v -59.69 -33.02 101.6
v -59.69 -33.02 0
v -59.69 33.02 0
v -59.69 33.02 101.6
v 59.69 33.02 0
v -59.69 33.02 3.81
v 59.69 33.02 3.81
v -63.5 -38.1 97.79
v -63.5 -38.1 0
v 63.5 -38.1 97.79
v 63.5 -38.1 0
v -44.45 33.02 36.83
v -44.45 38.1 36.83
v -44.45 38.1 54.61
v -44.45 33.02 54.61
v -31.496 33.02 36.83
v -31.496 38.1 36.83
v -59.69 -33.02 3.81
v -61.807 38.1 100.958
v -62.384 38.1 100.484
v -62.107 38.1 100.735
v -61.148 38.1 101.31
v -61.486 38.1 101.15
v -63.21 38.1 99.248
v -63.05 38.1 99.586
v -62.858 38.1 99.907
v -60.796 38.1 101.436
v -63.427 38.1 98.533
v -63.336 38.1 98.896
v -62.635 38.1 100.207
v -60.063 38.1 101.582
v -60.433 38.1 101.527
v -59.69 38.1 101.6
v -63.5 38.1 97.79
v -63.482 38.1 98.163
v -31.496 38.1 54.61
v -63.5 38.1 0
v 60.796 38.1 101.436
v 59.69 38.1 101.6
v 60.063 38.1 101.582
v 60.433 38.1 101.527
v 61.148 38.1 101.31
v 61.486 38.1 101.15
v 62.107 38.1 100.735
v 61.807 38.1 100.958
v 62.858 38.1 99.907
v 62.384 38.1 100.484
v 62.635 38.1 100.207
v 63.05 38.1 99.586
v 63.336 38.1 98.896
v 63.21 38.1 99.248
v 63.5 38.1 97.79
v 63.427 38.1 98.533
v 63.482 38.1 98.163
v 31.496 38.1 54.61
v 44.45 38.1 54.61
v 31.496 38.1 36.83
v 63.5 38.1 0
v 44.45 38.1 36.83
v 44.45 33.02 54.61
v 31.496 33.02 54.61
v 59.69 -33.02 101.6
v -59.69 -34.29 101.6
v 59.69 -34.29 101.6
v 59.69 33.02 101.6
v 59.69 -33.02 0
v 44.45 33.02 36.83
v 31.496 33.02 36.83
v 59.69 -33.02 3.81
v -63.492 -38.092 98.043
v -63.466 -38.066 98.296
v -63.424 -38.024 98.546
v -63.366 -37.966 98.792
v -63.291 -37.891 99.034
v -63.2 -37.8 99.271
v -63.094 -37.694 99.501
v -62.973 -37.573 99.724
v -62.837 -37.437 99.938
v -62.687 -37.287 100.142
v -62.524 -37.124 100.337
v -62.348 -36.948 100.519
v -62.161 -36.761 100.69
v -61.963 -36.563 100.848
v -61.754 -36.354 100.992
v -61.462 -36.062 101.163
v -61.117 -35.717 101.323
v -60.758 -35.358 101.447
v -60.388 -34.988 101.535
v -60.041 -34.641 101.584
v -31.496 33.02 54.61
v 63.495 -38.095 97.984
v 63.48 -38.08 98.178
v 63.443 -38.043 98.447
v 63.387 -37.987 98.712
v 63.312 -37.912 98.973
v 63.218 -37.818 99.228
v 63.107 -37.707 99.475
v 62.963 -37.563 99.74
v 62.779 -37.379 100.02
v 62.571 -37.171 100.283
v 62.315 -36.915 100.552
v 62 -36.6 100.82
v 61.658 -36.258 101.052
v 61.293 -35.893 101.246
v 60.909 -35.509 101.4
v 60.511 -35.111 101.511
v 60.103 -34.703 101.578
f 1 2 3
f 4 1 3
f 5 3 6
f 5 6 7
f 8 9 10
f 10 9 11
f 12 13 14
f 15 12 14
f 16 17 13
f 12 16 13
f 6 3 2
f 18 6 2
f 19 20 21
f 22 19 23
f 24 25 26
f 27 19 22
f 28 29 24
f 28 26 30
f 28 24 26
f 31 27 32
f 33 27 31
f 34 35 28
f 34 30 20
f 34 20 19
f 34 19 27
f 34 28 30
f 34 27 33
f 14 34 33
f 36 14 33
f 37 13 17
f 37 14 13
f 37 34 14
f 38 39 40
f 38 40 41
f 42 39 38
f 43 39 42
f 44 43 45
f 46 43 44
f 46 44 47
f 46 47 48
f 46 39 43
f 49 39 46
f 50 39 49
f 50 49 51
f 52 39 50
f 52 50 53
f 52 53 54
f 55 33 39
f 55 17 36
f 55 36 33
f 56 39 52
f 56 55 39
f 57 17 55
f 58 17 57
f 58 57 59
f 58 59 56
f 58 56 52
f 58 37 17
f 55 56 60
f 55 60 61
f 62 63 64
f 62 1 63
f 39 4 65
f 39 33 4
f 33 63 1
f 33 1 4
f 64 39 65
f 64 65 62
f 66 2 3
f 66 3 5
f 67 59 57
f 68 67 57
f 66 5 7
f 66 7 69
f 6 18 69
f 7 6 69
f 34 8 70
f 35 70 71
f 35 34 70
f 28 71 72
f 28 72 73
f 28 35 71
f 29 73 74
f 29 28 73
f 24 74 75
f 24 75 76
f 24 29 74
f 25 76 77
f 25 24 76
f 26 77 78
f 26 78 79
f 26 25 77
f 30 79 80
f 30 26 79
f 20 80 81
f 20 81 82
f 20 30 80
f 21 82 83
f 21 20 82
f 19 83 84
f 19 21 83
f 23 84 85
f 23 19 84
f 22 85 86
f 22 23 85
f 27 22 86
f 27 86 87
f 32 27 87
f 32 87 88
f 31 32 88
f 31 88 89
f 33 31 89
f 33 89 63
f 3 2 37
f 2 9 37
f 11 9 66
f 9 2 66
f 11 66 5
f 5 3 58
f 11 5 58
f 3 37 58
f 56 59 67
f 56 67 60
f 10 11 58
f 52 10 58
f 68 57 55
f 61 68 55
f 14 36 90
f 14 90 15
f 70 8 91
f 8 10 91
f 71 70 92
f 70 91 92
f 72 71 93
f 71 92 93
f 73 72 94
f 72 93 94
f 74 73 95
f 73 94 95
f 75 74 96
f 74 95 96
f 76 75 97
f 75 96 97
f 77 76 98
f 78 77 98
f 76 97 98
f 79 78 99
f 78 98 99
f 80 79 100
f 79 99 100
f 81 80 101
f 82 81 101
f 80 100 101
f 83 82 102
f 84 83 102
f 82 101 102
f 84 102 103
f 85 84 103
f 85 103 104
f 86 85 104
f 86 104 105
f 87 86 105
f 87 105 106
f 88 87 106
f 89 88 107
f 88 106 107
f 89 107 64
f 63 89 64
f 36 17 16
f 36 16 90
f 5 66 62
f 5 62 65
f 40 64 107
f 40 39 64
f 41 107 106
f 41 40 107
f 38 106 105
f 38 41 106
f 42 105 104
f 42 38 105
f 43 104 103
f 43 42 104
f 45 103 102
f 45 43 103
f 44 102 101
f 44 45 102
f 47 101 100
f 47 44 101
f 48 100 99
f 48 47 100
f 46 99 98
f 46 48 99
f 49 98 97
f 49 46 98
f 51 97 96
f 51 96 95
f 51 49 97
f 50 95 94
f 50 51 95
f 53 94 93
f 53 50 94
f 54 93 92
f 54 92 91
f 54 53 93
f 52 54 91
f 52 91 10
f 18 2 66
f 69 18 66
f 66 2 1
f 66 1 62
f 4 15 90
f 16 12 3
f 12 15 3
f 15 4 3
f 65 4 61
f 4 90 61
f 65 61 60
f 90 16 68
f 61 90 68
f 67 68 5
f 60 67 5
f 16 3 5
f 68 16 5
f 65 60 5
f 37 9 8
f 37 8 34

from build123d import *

# Parameters (mm, degrees)
F0_W     = 127
F0_H     = 76.2
F0_W_2   = 119.38
F0_H_2   = 66.04
F1_DEPTH = 101.6
F2_W     = 12.954
F2_H     = 17.78
F3_DEPTH = 5.08
F4_W     = 119.38
F4_H     = 66.04
F5_DEPTH = 3.81
F6_R     = 3.80999


# Not quite as in the source:
# - a fillet or chamfer is up to 0.001 mm smaller than in the source, because OpenCascade refuses the exact size


with BuildPart() as f1:
    # F0 (on Top) → F1 (new body)
    with BuildSketch(Plane.XY):
        Rectangle(F0_W, F0_H)
        Rectangle(F0_W_2, F0_H_2, mode=Mode.SUBTRACT)
    extrude(amount=F1_DEPTH)

    # F2 (on face) → F3 (cut, through all)
    with BuildSketch(Plane(origin=(0, 38.1, 0), x_dir=(-1, 0, 0), z_dir=(0, 1, 0))):
        with Locations((-37.973, 45.72)):
            Rectangle(F2_W, F2_H)
        with Locations((37.973, 45.72)):
            Rectangle(F2_W, F2_H)
    extrude(amount=-F3_DEPTH, mode=Mode.SUBTRACT)

    # F6 (radius 3.81 in the source; OpenCascade refuses exactly that, so slightly less here)
    f6_edges = [f1.edges().sort_by_distance(p)[0] for p in [
        (63.5, 0, 101.6),
        (0, -38.1, 101.6),
        (-63.5, 0, 101.6),
    ]]
    fillet(f6_edges, radius=F6_R)


with BuildPart() as f5:
    # F4 (on face) → F5 (new body)
    with BuildSketch(Plane(origin=(0, 0, 0), x_dir=(1, 0, 0), z_dir=(0, 0, -1))):
        Rectangle(F4_W, F4_H)
    extrude(amount=-F5_DEPTH)


solid = Compound([f1.part, f5.part])
